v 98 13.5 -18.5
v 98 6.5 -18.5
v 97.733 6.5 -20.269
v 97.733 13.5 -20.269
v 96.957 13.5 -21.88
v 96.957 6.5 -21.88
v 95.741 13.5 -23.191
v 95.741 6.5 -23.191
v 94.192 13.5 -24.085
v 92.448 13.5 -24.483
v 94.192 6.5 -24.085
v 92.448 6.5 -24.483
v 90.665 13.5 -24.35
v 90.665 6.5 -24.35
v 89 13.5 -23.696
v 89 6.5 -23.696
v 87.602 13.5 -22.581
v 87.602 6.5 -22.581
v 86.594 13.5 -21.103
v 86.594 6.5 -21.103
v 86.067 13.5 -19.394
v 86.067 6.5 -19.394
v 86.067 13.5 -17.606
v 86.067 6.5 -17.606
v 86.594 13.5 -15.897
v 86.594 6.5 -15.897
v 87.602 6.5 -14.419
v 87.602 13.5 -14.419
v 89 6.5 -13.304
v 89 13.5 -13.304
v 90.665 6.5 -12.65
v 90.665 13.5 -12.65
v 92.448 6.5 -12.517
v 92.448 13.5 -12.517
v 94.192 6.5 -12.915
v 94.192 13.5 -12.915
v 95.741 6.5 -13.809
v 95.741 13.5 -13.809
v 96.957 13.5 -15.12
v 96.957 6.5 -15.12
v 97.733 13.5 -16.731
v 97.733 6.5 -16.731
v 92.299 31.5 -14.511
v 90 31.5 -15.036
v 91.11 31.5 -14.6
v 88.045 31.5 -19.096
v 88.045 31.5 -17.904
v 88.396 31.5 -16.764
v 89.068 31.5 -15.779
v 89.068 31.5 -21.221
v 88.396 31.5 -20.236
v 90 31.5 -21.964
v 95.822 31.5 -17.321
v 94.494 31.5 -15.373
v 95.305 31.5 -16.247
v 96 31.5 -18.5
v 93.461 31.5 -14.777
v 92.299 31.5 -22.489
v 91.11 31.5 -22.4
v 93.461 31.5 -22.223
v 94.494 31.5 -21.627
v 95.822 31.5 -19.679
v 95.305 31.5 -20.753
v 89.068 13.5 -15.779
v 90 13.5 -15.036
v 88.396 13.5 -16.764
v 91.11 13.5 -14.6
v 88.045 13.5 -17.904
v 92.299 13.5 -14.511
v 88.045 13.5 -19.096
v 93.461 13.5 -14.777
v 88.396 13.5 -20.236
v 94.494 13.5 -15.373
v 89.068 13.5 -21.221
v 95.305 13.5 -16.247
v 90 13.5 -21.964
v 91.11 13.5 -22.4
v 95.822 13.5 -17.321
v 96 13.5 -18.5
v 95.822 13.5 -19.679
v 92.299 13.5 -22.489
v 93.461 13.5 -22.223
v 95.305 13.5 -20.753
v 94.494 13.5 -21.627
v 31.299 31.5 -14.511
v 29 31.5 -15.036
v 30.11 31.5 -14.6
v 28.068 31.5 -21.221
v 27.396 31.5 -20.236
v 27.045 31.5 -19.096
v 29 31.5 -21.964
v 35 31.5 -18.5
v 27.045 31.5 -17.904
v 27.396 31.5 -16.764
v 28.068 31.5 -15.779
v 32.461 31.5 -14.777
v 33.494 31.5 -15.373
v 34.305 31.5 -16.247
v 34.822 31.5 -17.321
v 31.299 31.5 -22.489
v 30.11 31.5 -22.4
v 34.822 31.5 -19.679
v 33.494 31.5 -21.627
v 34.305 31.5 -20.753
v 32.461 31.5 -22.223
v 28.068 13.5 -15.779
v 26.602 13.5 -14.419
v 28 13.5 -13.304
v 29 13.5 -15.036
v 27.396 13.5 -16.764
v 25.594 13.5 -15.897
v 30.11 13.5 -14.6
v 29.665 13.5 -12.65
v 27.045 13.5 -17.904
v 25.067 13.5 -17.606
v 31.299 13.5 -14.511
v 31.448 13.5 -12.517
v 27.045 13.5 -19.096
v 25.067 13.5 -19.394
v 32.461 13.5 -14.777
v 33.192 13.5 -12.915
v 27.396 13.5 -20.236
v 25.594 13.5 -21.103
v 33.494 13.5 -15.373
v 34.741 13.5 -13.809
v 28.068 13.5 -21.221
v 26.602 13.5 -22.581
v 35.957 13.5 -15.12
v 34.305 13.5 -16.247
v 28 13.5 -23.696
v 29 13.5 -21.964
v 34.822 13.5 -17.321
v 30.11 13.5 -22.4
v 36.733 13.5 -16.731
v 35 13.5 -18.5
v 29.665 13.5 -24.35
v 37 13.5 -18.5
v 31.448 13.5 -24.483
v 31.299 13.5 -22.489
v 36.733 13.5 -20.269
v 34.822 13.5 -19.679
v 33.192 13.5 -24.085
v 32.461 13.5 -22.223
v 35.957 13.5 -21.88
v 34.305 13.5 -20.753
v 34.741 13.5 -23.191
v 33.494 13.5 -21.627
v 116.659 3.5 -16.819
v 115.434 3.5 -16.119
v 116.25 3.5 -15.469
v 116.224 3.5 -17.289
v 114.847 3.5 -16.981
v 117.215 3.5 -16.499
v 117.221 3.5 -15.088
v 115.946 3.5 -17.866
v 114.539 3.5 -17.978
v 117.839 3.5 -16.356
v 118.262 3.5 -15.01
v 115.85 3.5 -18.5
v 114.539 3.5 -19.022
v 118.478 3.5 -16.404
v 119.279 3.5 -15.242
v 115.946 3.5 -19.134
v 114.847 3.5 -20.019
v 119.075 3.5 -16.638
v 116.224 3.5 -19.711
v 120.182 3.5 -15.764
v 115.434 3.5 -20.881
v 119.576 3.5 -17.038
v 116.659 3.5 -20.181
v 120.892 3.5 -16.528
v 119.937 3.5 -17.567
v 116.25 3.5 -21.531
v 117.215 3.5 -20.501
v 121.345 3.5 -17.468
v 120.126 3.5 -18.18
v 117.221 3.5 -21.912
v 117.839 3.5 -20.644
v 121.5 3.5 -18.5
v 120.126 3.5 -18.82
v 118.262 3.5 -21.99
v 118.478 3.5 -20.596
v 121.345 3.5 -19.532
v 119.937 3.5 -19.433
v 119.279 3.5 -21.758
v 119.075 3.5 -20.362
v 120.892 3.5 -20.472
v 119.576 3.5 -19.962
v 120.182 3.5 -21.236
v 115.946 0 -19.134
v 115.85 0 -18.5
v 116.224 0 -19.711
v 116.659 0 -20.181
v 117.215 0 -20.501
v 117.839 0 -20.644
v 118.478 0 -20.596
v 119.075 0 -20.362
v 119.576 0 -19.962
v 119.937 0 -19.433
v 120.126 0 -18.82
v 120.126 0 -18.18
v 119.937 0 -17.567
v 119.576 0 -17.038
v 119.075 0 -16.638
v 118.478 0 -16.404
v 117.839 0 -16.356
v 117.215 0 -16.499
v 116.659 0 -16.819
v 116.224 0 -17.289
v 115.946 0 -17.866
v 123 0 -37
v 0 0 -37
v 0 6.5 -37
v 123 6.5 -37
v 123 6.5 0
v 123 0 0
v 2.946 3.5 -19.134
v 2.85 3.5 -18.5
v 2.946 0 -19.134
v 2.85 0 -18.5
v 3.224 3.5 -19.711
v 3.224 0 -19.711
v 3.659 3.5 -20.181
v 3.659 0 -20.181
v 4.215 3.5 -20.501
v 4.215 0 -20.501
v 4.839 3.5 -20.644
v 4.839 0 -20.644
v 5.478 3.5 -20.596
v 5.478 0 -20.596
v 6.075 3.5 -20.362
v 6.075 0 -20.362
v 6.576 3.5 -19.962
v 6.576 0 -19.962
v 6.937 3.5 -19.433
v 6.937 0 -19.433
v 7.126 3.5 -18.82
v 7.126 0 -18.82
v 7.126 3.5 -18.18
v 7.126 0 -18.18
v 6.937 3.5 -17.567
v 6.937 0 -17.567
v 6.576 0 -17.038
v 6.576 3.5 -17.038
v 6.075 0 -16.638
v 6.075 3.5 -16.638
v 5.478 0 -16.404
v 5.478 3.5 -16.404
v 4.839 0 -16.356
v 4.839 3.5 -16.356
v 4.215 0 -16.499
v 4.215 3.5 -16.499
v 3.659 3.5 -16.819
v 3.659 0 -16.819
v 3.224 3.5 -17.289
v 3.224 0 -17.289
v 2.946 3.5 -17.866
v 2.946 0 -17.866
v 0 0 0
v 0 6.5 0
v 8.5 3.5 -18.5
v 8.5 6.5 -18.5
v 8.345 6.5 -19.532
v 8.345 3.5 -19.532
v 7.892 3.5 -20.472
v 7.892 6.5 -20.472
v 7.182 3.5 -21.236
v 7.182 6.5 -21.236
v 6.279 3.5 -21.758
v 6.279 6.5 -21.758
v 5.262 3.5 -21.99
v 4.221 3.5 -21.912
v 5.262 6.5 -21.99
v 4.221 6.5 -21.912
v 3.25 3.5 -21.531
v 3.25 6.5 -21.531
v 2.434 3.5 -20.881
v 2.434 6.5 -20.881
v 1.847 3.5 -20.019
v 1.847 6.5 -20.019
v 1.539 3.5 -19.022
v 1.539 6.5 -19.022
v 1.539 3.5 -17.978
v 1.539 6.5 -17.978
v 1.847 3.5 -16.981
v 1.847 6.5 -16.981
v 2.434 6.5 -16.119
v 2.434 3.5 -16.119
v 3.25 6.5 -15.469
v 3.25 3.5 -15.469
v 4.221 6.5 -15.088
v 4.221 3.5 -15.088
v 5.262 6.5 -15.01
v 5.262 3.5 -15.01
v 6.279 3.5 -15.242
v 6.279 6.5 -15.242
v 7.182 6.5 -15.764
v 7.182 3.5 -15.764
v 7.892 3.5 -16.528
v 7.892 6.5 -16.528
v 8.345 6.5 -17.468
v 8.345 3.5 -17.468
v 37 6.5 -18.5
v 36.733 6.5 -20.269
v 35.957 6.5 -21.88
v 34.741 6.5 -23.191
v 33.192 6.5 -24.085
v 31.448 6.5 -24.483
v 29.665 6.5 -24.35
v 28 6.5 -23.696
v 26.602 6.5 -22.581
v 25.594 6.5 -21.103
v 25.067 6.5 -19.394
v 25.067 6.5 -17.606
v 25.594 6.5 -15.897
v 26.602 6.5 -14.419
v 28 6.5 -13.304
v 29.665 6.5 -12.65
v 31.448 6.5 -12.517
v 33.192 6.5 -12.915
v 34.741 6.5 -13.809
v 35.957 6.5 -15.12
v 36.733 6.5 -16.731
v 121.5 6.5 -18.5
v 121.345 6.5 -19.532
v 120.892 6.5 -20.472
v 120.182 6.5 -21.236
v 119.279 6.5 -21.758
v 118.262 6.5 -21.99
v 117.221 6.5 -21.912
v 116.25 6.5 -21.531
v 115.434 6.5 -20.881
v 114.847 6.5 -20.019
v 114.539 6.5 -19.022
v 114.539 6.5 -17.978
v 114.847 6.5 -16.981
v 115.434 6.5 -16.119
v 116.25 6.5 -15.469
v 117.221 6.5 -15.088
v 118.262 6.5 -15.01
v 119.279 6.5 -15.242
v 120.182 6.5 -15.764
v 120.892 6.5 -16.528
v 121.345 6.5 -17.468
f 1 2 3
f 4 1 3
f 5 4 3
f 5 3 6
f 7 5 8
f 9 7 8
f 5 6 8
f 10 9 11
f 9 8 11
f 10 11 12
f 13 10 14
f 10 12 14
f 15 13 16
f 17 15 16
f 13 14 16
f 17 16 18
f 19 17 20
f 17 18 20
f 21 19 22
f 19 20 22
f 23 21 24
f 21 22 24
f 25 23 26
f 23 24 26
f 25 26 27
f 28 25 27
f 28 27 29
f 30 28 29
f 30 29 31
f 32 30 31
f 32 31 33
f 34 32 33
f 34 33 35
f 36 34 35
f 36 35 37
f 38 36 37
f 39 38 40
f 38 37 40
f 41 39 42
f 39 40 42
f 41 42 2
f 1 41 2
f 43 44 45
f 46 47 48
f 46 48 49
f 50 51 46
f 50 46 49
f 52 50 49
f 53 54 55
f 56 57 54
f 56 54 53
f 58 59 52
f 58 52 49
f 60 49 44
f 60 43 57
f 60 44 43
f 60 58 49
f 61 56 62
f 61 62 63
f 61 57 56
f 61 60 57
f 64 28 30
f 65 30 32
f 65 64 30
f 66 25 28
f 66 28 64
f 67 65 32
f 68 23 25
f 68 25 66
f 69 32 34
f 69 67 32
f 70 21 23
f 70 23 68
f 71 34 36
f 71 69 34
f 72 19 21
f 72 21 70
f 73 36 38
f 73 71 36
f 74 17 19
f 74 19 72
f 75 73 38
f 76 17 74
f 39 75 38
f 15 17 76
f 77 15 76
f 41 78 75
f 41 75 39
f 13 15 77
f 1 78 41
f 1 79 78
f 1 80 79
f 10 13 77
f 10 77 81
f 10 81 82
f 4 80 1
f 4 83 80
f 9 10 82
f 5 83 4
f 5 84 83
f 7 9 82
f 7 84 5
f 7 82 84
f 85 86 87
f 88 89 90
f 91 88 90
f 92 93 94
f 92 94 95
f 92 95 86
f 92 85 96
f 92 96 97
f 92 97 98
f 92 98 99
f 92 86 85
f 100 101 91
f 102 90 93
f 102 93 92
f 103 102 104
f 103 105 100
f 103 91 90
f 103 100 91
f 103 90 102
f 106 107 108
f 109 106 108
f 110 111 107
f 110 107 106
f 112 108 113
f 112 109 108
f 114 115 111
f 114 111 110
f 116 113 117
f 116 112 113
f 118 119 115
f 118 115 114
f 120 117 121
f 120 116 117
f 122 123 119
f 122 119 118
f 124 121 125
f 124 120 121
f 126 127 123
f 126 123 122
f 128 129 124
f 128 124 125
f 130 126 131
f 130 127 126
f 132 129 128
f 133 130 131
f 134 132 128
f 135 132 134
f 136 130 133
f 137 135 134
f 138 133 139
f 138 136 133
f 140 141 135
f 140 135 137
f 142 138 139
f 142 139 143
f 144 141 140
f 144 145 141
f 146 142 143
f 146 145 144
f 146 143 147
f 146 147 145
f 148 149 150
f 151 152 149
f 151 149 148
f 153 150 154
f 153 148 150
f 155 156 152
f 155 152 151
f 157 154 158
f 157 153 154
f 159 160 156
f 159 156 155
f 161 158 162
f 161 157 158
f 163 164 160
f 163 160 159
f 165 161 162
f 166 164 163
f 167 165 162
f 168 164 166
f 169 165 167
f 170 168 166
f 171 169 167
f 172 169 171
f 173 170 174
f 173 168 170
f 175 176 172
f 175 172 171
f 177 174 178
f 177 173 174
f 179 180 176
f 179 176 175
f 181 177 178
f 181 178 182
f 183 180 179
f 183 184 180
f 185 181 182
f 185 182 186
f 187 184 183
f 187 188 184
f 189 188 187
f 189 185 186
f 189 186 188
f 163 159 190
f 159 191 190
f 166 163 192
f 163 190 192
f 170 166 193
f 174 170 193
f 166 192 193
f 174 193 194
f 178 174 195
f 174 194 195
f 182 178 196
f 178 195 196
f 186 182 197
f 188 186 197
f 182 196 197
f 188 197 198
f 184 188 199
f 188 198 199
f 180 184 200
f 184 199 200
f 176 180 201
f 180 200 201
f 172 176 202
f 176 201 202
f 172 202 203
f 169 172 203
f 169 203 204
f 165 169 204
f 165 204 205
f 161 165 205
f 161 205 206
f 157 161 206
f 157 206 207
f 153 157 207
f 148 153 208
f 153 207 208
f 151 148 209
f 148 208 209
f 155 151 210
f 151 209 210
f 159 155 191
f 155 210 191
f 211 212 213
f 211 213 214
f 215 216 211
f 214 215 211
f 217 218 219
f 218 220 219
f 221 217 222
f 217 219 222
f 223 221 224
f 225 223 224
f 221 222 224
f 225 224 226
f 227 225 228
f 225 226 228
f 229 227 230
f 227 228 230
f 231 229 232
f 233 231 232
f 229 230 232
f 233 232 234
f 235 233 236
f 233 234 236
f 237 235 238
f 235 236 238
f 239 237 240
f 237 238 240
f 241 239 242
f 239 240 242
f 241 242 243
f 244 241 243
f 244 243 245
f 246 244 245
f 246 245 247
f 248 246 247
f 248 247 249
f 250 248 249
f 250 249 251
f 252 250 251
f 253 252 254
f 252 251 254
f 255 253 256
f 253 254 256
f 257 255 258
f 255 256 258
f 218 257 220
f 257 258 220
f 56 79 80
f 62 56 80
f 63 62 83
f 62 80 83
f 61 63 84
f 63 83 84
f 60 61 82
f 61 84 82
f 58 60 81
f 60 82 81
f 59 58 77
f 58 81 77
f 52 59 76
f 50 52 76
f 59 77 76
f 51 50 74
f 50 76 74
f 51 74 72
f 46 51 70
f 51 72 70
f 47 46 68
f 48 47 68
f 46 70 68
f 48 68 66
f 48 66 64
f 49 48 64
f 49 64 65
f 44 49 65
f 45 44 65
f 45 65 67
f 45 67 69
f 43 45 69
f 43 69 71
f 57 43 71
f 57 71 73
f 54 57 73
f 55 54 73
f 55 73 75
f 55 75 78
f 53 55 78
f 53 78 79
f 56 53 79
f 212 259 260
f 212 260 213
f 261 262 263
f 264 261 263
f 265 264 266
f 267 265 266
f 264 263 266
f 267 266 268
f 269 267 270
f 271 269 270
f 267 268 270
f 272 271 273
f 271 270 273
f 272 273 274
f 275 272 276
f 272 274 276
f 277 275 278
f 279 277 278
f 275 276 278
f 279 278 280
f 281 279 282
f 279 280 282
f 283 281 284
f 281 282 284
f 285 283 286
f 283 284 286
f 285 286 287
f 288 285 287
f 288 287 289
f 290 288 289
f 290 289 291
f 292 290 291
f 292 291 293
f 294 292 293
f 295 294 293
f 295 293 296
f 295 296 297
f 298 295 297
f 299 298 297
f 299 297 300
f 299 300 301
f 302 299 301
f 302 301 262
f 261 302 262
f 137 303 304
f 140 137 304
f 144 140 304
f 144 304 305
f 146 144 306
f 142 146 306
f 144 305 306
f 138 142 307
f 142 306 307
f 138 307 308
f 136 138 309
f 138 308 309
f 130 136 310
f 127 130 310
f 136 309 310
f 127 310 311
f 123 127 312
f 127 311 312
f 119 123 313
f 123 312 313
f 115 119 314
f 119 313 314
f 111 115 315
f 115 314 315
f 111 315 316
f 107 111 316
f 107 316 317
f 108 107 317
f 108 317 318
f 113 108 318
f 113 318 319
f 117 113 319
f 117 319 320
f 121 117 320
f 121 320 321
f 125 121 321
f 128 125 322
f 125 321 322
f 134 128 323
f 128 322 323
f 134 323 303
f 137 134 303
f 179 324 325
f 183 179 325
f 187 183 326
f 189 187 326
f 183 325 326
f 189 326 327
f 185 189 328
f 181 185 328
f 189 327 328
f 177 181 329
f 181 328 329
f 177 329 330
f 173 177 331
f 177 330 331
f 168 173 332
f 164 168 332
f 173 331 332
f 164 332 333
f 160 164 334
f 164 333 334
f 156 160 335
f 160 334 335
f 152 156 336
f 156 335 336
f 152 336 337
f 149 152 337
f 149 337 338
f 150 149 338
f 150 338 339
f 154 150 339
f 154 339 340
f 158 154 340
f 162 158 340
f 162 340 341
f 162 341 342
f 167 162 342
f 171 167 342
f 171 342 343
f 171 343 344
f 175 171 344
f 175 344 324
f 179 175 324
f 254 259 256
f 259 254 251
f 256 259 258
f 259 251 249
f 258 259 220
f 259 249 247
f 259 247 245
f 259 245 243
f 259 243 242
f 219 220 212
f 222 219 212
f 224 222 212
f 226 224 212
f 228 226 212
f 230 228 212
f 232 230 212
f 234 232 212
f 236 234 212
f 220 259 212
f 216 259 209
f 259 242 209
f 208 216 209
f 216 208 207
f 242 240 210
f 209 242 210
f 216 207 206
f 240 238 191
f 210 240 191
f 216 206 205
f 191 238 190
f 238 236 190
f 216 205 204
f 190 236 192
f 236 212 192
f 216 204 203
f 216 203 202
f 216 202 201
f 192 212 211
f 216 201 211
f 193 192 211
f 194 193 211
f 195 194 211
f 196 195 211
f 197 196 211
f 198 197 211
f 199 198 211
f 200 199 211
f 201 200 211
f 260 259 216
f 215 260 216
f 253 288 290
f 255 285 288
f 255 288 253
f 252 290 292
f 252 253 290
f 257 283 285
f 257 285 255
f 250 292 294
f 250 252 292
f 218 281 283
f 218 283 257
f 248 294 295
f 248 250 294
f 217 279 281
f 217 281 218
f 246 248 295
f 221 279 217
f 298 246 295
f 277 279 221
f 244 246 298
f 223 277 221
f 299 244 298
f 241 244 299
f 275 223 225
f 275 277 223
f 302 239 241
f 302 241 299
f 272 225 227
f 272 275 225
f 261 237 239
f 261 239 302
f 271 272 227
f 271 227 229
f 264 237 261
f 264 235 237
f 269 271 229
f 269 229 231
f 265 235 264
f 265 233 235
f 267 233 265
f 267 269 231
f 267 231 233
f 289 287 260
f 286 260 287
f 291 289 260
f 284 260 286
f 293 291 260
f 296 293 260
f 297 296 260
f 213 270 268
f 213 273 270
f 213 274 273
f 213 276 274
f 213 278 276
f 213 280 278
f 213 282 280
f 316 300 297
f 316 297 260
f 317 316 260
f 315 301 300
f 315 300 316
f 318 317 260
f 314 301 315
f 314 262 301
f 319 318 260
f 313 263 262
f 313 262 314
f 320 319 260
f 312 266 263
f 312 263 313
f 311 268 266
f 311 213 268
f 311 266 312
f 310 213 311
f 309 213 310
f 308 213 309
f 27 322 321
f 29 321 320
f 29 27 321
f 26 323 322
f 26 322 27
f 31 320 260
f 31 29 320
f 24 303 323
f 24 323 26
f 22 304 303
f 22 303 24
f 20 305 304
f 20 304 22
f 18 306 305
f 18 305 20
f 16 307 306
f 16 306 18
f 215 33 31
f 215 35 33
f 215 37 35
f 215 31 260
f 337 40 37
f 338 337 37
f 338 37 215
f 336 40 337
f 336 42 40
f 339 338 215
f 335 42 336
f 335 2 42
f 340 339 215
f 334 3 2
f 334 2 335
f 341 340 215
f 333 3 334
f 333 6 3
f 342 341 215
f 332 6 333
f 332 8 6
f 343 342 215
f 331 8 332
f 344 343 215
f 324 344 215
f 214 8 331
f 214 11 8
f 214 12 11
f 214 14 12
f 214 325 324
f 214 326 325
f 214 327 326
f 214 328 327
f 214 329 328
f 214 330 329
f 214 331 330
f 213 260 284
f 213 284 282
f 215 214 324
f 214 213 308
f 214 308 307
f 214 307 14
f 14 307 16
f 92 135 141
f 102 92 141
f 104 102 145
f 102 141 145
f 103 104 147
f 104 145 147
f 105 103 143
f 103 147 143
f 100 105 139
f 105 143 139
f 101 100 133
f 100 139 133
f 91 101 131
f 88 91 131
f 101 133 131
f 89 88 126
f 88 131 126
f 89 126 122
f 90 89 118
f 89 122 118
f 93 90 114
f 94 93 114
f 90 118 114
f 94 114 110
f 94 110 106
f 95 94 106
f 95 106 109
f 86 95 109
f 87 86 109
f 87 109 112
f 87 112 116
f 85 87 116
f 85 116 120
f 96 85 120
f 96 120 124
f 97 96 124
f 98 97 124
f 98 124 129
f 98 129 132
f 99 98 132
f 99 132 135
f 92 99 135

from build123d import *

# Parameters (mm, degrees)
SKETCH1_W                                        = 123
SKETCH1_H                                        = 37
BOSS_EXTRUDE1_DEPTH                              = 6.5
CBORE_FOR_M4_HEX_HEAD_MACHINE_SCREW1_D           = 4.3
CBORE_FOR_M4_HEX_HEAD_MACHINE_SCREW1_CBORE_D     = 7
CBORE_FOR_M4_HEX_HEAD_MACHINE_SCREW1_CBORE_DEPTH = 3
SKETCH7_R                                        = 4
BOSS_EXTRUDE2_DEPTH                              = 25
SKETCH8_R                                        = 6
BOSS_EXTRUDE3_DEPTH                              = 7


with BuildPart() as part:
    # Sketch1 → Boss-Extrude1 (new body)
    with BuildSketch(Plane(origin=(0, 0, 0), x_dir=(1, 0, 0), z_dir=(0, 1, 0))):
        with Locations((61.5, 18.5)):
            Rectangle(SKETCH1_W, SKETCH1_H)
    extrude(amount=BOSS_EXTRUDE1_DEPTH)

    # CBORE for M4 Hex Head Machine Screw1 (through all)
    with Locations(Plane(origin=(0, 6.5, 0), x_dir=(1, 0, 0), z_dir=(0, 1, 0))):
        with Locations((5, 18.5), (118, 18.5)):
            CounterBoreHole(CBORE_FOR_M4_HEX_HEAD_MACHINE_SCREW1_D / 2, CBORE_FOR_M4_HEX_HEAD_MACHINE_SCREW1_CBORE_D / 2, CBORE_FOR_M4_HEX_HEAD_MACHINE_SCREW1_CBORE_DEPTH)

    # Sketch7 → Boss-Extrude2 (add)
    with BuildSketch(Plane(origin=(0, 6.5, 0), x_dir=(1, 0, 0), z_dir=(0, 1, 0))):
        with Locations((31, 18.5)):
            Circle(SKETCH7_R)
        with Locations((92, 18.5)):
            Circle(SKETCH7_R)
    extrude(amount=BOSS_EXTRUDE2_DEPTH)

    # Sketch8 → Boss-Extrude3 (add)
    with BuildSketch(Plane(origin=(0, 6.5, 0), x_dir=(1, 0, 0), z_dir=(0, 1, 0))):
        with Locations((31, 18.5)):
            Circle(SKETCH8_R)
        with Locations((92, 18.5)):
            Circle(SKETCH8_R)
    extrude(amount=BOSS_EXTRUDE3_DEPTH)


solid = part.part
